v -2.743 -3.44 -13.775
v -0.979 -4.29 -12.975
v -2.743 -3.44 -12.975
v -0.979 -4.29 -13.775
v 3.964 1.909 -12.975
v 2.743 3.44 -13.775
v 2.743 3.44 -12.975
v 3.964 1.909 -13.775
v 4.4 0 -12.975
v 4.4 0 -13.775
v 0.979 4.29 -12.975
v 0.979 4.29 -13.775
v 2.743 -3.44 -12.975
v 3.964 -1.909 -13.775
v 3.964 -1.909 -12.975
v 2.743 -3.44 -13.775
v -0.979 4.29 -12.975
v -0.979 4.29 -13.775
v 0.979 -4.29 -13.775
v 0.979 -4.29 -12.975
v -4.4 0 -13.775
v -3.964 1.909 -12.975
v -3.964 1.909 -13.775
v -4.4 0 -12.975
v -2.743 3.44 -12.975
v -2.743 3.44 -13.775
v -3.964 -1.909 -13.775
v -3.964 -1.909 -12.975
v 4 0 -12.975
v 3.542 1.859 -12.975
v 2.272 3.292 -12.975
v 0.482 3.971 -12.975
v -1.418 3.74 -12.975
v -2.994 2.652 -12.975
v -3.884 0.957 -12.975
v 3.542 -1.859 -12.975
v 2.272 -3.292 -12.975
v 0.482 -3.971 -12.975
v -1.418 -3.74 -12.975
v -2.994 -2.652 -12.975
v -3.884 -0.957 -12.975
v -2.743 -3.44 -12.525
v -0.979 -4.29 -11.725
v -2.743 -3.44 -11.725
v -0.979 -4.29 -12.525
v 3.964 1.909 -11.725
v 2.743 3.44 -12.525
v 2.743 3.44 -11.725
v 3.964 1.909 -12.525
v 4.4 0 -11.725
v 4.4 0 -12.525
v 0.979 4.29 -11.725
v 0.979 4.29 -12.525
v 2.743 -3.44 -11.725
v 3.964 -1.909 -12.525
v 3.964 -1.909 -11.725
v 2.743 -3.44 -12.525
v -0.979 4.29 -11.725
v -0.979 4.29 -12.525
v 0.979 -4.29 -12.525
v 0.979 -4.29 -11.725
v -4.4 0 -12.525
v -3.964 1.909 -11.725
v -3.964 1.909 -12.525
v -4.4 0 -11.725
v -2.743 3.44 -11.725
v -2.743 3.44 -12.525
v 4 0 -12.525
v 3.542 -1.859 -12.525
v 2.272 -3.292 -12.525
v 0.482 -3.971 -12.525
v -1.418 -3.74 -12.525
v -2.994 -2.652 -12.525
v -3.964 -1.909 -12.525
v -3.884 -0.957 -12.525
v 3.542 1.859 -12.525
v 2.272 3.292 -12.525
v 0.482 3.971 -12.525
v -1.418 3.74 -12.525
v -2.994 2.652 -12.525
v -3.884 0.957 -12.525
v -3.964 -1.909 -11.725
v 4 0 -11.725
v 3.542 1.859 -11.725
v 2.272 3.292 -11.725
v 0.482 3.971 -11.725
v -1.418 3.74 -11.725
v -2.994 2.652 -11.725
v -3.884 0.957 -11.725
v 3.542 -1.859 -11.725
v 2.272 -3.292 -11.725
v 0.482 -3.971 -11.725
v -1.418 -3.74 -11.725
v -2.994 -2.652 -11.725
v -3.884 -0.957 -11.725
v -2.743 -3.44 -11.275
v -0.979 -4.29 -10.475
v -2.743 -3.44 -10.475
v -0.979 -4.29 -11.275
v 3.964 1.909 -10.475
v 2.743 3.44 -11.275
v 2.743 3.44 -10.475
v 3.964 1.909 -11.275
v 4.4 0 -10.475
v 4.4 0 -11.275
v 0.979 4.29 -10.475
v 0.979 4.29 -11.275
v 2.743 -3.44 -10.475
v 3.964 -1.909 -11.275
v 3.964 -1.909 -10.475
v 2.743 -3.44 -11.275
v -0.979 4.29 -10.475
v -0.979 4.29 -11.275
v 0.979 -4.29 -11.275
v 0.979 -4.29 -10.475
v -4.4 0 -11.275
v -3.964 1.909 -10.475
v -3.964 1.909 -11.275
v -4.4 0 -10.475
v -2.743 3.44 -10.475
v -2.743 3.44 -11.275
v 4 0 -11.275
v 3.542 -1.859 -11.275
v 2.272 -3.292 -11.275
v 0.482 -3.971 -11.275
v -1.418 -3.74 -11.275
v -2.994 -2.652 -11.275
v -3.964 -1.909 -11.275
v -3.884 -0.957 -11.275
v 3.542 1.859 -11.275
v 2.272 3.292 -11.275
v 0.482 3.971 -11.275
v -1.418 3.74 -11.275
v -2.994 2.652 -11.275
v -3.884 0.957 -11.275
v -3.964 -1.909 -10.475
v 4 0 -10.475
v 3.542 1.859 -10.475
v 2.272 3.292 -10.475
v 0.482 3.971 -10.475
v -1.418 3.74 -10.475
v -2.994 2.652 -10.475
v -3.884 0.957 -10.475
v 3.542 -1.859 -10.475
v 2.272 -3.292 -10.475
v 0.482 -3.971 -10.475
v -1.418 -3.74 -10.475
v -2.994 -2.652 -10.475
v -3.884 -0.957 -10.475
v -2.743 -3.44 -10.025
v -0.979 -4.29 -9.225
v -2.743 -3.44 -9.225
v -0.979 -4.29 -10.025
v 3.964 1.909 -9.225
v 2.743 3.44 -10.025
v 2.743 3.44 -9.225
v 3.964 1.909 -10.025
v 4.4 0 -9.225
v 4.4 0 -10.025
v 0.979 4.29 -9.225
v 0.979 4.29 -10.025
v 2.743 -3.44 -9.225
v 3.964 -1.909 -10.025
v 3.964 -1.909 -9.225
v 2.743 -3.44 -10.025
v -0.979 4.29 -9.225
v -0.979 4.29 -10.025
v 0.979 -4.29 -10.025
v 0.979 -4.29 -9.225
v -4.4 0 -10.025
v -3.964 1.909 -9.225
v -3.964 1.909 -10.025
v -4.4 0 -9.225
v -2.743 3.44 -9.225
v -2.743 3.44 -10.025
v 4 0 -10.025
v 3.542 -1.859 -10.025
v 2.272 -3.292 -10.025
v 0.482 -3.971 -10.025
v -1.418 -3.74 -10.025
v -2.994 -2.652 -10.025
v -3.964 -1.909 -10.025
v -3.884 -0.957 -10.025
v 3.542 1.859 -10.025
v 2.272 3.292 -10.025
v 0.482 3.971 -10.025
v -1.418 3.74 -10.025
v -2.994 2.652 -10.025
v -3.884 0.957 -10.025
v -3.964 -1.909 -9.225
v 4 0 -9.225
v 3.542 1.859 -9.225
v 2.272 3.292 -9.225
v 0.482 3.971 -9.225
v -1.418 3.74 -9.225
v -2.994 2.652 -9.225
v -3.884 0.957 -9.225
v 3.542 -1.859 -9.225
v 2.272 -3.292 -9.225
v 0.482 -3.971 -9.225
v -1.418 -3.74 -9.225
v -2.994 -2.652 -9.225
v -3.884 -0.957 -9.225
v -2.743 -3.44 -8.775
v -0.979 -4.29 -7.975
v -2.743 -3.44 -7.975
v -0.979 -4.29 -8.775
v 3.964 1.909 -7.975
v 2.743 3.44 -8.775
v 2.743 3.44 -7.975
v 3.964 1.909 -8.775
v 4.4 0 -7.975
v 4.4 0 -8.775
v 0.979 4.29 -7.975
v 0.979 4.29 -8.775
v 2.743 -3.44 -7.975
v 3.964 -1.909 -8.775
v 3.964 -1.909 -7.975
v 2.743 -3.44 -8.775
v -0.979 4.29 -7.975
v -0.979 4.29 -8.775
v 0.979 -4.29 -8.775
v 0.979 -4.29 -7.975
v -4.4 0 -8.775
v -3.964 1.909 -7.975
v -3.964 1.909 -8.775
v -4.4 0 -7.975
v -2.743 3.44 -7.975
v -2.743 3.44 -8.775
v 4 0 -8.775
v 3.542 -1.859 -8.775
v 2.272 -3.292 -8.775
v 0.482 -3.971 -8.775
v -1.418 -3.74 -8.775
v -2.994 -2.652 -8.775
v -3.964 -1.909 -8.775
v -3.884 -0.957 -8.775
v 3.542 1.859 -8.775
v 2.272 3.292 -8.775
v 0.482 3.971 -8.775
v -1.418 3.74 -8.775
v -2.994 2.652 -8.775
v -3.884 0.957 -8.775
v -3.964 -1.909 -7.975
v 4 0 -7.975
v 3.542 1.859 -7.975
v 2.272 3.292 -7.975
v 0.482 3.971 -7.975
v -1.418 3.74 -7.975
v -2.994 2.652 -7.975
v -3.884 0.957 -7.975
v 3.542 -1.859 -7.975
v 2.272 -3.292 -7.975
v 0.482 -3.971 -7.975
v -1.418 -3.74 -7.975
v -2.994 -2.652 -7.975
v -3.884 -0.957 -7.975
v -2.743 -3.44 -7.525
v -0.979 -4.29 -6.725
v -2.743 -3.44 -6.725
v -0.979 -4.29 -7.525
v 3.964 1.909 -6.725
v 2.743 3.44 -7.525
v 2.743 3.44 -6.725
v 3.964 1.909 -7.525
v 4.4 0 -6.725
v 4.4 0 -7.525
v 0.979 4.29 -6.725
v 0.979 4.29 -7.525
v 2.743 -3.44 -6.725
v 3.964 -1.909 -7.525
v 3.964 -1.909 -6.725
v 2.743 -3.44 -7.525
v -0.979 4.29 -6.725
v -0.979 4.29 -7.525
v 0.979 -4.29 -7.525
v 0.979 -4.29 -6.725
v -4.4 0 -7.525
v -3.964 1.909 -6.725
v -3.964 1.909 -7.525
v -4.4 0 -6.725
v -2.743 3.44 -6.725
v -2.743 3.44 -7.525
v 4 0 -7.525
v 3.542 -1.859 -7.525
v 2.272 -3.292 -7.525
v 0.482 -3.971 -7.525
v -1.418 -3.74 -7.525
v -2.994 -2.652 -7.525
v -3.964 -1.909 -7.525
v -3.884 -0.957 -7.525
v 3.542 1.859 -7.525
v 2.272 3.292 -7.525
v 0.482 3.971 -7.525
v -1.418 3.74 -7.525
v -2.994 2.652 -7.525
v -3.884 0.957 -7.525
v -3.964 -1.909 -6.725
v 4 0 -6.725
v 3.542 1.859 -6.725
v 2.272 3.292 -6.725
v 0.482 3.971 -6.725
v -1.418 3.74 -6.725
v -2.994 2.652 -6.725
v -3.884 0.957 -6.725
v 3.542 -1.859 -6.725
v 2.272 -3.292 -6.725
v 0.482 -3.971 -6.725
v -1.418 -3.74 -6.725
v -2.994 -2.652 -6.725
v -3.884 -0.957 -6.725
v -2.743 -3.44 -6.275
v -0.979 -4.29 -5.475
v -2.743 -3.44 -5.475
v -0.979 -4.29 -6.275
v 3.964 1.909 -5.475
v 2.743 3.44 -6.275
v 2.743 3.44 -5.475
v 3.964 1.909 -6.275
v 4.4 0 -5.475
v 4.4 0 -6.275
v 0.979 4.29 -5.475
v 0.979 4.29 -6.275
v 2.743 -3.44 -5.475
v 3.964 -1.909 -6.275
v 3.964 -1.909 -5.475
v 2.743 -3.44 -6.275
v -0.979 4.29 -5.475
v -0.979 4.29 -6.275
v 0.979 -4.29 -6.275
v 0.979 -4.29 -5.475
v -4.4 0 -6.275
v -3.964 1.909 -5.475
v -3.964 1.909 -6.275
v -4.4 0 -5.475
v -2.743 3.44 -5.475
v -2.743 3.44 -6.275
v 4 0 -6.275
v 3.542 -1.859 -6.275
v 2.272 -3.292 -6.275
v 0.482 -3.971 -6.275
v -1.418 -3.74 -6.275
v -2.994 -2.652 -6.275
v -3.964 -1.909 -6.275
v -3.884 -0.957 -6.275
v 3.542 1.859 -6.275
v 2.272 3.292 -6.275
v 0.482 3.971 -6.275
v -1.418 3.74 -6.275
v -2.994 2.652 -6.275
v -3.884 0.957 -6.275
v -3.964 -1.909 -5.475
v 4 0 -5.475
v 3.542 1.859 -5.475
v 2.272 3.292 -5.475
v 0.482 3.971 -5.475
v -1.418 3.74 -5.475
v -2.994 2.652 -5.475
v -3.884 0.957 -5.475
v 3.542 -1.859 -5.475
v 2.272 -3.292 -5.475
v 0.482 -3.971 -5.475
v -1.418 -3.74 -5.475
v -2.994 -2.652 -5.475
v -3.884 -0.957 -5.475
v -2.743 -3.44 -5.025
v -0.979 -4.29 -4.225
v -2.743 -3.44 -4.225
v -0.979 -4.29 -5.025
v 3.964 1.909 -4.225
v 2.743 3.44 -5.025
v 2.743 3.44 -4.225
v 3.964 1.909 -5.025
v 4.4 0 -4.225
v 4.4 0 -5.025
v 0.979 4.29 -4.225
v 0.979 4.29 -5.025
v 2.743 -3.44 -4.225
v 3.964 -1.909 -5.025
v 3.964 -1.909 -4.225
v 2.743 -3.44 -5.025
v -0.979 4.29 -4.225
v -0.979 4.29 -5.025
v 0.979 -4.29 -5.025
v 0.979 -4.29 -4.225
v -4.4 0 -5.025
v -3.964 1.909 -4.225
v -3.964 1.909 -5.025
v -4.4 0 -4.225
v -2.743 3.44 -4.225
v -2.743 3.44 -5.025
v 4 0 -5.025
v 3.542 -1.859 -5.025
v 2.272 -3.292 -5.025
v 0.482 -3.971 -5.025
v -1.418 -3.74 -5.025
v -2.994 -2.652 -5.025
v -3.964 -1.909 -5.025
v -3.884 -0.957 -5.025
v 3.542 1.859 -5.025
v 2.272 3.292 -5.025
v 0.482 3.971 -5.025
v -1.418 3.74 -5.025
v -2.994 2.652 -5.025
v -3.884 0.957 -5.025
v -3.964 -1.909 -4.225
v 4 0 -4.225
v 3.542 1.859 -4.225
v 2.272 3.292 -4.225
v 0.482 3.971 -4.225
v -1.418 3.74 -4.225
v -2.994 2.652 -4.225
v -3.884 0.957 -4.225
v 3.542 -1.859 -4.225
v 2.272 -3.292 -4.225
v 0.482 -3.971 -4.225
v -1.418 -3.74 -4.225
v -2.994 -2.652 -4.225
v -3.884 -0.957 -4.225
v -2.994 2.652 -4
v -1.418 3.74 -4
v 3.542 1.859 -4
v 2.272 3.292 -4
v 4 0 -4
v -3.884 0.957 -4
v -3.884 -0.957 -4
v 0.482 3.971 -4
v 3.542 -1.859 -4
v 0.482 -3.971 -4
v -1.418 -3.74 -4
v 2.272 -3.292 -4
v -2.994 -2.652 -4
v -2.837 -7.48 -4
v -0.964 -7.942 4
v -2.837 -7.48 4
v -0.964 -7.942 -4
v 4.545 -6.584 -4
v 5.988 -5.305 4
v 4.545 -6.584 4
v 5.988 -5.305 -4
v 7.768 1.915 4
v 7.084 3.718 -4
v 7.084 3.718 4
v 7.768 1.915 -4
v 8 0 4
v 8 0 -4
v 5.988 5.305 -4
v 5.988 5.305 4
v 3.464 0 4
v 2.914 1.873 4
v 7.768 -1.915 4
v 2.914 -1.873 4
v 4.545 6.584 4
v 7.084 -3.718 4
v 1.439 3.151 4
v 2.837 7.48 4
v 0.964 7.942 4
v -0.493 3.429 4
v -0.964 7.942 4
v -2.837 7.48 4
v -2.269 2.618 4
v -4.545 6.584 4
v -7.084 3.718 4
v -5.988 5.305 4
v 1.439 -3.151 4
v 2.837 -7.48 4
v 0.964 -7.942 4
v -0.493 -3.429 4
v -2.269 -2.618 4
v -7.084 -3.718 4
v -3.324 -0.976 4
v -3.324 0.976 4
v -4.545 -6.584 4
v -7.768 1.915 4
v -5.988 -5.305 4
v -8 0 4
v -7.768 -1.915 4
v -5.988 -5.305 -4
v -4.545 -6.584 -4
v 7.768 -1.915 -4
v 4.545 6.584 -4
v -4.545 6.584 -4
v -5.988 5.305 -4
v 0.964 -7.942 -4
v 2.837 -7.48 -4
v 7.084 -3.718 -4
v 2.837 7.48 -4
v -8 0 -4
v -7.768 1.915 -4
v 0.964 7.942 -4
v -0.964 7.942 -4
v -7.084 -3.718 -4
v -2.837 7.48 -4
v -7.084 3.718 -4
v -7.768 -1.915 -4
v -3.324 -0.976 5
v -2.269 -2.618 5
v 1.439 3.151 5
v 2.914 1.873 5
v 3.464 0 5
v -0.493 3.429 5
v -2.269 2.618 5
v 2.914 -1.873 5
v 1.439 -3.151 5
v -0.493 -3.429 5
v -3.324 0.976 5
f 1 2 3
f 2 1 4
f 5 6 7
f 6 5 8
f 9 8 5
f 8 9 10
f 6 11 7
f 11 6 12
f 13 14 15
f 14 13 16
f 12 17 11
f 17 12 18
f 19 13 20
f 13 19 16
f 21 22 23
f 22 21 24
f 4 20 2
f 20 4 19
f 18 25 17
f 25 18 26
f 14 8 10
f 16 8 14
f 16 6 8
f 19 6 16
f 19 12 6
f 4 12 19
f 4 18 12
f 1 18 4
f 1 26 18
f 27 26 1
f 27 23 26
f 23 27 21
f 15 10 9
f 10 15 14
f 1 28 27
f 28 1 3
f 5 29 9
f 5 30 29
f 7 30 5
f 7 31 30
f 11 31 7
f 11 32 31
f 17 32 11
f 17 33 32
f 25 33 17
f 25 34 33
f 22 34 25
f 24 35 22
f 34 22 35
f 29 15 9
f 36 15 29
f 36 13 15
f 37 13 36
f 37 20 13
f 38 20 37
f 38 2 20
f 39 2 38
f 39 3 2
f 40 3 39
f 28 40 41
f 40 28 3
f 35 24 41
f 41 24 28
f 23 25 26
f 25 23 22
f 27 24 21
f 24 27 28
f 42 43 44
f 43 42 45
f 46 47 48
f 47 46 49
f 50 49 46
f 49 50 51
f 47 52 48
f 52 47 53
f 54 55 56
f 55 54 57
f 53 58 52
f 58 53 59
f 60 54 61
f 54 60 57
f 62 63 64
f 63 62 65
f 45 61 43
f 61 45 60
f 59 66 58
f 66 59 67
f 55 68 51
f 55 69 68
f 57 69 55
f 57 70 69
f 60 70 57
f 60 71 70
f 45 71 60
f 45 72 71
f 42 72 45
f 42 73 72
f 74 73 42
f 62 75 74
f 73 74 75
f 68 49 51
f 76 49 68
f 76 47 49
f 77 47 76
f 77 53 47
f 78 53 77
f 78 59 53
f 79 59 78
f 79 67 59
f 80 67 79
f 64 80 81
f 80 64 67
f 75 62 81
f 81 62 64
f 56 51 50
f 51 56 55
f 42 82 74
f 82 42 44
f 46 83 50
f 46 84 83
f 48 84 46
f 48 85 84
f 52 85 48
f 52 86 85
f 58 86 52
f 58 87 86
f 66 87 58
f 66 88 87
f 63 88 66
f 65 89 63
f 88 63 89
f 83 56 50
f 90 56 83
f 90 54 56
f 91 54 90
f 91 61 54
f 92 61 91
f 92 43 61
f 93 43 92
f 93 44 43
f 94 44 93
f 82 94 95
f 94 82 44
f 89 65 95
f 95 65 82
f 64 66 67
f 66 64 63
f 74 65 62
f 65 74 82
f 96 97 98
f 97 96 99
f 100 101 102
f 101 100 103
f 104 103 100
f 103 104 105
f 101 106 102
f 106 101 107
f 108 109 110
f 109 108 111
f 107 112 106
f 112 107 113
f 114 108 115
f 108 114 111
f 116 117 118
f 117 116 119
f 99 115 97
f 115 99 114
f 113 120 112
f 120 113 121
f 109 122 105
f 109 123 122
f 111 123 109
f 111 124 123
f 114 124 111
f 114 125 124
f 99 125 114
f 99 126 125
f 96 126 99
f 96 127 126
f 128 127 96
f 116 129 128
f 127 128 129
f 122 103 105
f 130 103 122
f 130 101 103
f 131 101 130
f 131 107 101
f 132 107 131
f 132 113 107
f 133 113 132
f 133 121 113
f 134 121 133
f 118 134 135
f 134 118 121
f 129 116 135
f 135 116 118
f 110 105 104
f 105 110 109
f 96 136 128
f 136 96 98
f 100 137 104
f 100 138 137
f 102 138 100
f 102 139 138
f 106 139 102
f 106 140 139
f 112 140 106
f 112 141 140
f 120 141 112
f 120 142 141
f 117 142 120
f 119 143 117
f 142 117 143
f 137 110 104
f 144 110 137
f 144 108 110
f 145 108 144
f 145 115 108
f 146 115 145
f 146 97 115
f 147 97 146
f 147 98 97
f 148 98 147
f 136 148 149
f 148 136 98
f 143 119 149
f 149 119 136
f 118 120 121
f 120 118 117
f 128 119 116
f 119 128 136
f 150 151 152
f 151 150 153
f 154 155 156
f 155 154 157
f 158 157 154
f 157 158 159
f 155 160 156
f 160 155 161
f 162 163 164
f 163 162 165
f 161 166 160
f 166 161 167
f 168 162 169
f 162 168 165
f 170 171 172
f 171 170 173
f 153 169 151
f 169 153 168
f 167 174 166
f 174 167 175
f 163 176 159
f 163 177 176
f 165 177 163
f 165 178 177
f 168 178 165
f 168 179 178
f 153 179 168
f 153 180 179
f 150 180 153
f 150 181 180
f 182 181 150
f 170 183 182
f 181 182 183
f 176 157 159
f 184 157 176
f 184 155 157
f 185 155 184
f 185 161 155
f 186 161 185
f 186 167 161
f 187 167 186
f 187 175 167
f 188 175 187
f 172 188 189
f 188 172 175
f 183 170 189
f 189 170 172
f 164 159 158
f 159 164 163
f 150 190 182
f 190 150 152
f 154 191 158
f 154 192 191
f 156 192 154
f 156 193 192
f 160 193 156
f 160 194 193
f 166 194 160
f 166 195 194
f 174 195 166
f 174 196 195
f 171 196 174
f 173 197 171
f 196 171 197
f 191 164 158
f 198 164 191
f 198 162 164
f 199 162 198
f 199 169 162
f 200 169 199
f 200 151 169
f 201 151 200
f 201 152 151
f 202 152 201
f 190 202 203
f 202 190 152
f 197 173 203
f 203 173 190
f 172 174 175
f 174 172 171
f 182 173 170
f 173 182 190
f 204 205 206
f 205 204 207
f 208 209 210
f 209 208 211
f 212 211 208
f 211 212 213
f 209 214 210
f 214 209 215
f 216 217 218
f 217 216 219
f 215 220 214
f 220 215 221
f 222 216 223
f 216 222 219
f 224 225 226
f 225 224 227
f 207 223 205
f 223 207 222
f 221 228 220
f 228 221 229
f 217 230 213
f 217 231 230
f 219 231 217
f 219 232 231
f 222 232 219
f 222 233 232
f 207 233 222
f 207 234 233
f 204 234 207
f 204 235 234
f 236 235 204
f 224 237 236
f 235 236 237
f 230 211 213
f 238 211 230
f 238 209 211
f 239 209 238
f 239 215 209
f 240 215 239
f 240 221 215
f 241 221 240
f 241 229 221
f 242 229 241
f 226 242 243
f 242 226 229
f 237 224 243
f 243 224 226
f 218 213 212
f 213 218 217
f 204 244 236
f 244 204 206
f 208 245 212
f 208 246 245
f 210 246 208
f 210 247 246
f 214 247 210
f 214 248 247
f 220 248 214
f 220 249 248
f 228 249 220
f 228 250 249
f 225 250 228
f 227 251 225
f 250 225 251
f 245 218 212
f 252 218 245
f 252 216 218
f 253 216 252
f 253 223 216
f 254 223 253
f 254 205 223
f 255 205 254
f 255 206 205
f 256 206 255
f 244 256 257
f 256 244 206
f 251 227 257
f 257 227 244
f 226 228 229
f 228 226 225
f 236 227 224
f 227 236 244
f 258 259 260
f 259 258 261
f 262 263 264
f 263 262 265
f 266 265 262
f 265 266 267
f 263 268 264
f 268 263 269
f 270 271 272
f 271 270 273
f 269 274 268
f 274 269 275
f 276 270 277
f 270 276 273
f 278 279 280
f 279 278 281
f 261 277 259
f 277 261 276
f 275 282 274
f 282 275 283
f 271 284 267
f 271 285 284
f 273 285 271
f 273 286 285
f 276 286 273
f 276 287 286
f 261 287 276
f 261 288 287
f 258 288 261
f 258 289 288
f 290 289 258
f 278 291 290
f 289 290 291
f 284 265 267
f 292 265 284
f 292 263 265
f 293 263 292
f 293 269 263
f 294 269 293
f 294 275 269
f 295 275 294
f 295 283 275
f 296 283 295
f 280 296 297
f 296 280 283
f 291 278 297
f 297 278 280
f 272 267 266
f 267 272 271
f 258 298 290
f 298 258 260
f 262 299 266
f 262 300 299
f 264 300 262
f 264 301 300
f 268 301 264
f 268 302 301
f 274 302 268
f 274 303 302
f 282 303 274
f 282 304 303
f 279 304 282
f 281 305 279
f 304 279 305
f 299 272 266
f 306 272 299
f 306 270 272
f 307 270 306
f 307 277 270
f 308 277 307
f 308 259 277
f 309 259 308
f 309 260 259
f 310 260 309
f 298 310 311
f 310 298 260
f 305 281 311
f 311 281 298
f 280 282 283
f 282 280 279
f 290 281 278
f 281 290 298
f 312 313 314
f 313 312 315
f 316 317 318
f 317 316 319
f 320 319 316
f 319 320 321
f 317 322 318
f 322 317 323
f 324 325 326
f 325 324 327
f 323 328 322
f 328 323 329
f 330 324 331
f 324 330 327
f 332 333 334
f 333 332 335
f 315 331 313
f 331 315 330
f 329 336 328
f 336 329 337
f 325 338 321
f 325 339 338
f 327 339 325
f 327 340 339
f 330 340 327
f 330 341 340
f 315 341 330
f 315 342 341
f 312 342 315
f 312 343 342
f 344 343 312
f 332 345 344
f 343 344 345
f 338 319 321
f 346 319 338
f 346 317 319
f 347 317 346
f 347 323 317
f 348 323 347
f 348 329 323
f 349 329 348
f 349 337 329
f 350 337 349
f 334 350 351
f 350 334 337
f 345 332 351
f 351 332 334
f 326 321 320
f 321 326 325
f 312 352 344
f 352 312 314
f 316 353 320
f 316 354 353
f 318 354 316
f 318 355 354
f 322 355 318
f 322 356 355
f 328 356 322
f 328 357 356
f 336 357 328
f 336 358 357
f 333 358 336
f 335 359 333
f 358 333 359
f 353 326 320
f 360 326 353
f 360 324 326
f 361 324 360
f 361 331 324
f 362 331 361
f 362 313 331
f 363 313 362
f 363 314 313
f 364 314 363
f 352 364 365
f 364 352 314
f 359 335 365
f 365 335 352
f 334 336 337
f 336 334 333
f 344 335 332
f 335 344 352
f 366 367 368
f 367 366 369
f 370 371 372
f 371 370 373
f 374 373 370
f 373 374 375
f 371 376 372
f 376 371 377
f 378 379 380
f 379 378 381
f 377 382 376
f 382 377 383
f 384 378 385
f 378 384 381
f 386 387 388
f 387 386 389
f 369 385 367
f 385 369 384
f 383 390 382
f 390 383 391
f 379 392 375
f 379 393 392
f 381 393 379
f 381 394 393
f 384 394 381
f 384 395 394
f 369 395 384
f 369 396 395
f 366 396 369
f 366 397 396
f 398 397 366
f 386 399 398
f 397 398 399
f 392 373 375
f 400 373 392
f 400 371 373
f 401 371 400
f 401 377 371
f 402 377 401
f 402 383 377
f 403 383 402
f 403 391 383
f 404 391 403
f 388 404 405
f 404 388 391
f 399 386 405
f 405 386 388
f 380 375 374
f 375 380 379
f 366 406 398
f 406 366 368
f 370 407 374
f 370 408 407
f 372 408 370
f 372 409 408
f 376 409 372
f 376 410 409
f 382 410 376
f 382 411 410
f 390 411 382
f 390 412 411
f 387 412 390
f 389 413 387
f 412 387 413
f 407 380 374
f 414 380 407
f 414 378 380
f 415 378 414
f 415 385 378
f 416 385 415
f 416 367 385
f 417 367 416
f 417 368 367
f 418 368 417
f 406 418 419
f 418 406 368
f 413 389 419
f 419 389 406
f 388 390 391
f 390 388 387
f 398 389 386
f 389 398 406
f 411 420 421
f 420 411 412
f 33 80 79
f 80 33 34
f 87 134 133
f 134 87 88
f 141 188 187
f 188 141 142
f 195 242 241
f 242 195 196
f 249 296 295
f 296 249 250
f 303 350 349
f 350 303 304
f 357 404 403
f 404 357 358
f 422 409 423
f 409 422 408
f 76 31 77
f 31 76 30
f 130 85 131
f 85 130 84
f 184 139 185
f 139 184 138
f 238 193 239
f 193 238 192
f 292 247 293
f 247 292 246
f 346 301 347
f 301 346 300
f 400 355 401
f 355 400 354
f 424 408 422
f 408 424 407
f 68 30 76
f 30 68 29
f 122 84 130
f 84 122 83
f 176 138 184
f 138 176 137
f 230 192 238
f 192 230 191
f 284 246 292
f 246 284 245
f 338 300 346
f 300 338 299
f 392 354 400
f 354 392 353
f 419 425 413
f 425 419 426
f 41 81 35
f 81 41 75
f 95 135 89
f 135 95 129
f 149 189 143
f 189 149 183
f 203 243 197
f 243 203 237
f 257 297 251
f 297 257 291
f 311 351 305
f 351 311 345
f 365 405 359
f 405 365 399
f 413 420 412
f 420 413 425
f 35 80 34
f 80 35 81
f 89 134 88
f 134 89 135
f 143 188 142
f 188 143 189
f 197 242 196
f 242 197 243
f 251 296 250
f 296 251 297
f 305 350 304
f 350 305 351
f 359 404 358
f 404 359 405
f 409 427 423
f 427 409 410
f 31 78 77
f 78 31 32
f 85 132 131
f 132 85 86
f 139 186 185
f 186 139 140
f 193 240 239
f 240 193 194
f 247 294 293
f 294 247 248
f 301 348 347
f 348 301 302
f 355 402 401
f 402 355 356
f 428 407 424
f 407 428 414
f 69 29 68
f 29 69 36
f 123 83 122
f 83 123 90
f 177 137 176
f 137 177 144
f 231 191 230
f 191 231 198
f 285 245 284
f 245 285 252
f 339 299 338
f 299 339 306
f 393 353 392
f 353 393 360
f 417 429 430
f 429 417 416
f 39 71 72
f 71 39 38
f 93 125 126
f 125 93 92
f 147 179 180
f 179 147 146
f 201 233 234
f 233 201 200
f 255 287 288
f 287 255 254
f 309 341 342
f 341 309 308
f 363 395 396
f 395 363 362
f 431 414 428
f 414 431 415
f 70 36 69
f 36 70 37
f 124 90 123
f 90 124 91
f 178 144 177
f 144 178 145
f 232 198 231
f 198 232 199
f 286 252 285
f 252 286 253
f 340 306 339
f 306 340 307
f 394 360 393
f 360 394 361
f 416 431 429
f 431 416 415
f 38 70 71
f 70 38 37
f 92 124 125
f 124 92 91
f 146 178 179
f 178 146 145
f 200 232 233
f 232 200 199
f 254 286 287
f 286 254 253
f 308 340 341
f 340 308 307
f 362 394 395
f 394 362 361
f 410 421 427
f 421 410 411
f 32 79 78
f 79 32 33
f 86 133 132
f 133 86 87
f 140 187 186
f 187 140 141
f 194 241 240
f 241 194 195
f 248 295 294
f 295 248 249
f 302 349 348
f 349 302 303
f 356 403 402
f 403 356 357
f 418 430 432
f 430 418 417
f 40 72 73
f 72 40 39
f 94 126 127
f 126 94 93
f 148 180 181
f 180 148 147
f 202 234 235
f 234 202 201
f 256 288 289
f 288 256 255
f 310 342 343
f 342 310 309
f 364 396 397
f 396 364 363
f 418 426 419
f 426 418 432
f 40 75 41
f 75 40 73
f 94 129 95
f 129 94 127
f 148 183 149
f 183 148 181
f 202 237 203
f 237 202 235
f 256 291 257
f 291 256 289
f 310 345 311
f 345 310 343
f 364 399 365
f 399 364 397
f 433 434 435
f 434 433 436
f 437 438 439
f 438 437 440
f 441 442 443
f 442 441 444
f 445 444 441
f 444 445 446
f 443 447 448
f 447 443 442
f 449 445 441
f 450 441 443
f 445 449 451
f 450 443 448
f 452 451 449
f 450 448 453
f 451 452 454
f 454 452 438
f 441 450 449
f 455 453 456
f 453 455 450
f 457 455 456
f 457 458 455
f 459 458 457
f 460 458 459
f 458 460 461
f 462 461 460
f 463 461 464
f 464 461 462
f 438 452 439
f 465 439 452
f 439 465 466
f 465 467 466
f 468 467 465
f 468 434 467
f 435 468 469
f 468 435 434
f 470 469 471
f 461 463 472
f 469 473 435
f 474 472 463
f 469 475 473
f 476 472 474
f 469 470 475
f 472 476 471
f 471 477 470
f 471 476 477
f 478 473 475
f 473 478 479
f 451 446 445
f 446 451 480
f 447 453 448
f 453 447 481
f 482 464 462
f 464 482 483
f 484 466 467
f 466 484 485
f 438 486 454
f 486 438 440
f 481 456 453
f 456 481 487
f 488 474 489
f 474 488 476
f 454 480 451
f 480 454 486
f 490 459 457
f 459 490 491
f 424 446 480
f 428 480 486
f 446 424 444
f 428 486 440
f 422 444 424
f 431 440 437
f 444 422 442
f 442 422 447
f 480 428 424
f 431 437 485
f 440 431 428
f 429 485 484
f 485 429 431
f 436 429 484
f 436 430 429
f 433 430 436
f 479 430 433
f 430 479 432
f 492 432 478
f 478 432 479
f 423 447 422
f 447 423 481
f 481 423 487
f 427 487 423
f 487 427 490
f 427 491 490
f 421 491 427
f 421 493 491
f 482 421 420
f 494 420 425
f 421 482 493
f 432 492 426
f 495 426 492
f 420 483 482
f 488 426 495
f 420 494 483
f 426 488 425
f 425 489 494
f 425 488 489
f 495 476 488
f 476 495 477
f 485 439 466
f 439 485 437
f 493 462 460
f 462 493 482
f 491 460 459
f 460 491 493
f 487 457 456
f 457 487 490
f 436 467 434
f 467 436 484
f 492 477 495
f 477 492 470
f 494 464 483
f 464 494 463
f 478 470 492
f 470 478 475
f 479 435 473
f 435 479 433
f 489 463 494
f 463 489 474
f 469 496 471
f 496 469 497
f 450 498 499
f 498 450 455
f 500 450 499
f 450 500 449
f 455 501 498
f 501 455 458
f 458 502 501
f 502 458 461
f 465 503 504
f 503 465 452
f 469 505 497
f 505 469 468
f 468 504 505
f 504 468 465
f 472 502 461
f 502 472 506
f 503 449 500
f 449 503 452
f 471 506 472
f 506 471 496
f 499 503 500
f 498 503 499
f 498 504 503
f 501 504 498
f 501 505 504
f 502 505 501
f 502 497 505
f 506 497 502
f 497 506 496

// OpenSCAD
// Parameters
shank_diameter_mm = 8; //[4:16:0.1]
head_diameter_mm = 16; //[8:32:0.1]
length_mm = 10; //[5:20:0.1]
head_height_mm = 8; //[4:16:0.1]
socket_af_mm = 6; //[3:12:0.1]
socket_depth_mm = 4; //[2:8:0.1]
thread_major_diameter_mm = 8; //[4:16:0.1]
thread_minor_diameter_mm = 6.6; //[3.3:13.2:0.1]
threaded_length_mm = 10; //[5:20:0.1]
thread_ridge_count = 8; //[4:20:1]
thread_ridge_height_mm = 0.4; //[0.2:1:0.05]
thread_ridge_width_mm = 0.8; //[0.4:2:0.05]
overlap_mm = 1; //[0.5:2:0.1]

// Screw and Washer
module screw_and_washer() {
  color("DimGray") {
    // Screw Body
    translate([0, 0, -head_height_mm/2 - length_mm/2 + overlap_mm])
      cylinder(r=shank_diameter_mm/2, h=length_mm, center=true);

    // Cylindrical Head
    translate([0, 0, 0])
      cylinder(r=head_diameter_mm/2, h=head_height_mm, center=true);

    // Hex Socket Recess
    translate([0, 0, head_height_mm/2 - socket_depth_mm/2])
      rotate([0, 0, 0])
      cylinder(r=socket_af_mm/(2*cos(30)), h=socket_depth_mm + 2*overlap_mm, center=true);

    // Thread Core
    translate([0, 0, -head_height_mm/2 - threaded_length_mm/2 + overlap_mm])
      cylinder(r=thread_minor_diameter_mm/2, h=threaded_length_mm, center=true);

    // Thread Ridges
    for (i = [0:thread_ridge_count-1]) {
      translate([0, 0, -head_height_mm/2 - threaded_length_mm + (i+0.5)*threaded_length_mm/thread_ridge_count])
        cylinder(r=thread_major_diameter_mm/2 + thread_ridge_height_mm, h=thread_ridge_width_mm, center=true);
    }
  }
}

// Assembly
module assembly() {
  screw_and_washer();
}

assembly();
